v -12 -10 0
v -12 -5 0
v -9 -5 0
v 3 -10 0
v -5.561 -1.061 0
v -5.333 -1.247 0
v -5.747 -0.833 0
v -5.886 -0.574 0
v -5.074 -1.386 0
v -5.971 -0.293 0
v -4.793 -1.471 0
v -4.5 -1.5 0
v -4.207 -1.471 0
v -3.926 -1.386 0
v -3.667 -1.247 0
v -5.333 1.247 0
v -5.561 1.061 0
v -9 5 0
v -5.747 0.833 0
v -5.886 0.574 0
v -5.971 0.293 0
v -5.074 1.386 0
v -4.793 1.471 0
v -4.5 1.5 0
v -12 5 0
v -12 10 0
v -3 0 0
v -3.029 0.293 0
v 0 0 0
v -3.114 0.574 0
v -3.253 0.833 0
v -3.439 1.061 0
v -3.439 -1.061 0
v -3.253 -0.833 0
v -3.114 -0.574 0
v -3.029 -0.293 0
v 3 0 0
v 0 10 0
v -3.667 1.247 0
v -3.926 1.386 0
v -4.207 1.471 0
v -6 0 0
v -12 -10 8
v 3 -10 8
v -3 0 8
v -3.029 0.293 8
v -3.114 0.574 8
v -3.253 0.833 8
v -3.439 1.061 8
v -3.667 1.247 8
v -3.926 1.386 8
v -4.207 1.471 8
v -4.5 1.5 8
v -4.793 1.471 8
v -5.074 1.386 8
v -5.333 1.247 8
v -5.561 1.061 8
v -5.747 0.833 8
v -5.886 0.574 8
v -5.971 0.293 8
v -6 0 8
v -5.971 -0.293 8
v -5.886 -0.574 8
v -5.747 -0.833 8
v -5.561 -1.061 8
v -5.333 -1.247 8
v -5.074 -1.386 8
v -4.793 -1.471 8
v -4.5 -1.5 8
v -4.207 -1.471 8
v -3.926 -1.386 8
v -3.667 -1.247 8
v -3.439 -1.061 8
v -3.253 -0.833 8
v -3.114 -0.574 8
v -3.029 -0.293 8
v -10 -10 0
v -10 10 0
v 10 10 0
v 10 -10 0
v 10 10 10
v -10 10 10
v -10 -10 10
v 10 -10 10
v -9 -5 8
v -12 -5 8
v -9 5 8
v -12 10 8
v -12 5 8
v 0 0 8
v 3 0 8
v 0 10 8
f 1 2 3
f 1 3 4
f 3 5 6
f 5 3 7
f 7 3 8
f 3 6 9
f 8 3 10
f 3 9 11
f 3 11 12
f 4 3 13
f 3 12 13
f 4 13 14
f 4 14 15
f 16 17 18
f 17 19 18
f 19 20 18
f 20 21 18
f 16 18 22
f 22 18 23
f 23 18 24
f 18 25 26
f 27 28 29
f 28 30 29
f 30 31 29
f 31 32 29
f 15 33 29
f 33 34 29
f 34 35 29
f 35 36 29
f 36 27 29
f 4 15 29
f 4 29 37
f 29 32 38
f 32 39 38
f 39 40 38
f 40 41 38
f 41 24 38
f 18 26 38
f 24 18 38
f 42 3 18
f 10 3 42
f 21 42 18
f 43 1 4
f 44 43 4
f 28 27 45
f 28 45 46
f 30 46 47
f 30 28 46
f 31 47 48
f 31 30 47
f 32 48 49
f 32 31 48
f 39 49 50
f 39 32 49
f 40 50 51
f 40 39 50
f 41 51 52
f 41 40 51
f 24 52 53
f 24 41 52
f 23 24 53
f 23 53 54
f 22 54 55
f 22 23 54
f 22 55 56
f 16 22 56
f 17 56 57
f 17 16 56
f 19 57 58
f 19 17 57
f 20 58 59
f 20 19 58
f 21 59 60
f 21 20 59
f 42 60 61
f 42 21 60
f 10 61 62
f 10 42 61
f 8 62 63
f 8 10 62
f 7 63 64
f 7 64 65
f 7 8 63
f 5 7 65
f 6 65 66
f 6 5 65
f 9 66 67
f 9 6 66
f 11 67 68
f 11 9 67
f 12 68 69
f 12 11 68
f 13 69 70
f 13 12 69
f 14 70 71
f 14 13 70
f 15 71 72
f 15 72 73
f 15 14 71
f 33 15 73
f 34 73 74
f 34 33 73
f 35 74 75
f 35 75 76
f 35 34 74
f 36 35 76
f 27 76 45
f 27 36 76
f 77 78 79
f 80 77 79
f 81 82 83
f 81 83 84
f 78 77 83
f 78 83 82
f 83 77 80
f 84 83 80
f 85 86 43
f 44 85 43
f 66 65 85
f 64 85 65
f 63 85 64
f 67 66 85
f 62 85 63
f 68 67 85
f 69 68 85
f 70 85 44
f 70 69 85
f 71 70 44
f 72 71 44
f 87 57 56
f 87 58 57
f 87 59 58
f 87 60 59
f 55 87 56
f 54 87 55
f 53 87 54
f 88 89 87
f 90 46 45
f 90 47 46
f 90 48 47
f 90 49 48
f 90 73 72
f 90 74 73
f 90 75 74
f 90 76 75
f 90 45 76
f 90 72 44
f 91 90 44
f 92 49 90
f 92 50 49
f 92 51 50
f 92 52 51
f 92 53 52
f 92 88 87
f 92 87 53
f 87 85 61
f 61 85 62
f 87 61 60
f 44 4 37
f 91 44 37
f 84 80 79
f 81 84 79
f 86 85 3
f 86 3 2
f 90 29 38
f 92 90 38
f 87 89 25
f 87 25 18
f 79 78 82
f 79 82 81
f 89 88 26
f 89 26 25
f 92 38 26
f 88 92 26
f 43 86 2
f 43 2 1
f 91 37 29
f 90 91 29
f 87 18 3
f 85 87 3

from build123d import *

# Parameters (mm, degrees)
F0_W     = 20
F0_H     = 20
F1_DEPTH = 10
F2_R     = 1.5
F3_DEPTH = 8


with BuildPart() as f1:
    # F0 (on Top) → F1 (new body)
    with BuildSketch(Plane.XY):
        Rectangle(F0_W, F0_H)
    extrude(amount=F1_DEPTH)


with BuildPart() as f3:
    # F2 (on Top) → F3 (new body)
    with BuildSketch(Plane.XY):
        Polygon((-12, -10), (3, -10), (3, 0), (0, 0), (0, 10), (-12, 10), (-12, 5), (-9, 5), (-9, -5), (-12, -5), align=None)
        with Locations((-4.5, 0)):
            Circle(F2_R, mode=Mode.SUBTRACT)
    extrude(amount=F3_DEPTH)


solid = Compound([f1.part, f3.part])
